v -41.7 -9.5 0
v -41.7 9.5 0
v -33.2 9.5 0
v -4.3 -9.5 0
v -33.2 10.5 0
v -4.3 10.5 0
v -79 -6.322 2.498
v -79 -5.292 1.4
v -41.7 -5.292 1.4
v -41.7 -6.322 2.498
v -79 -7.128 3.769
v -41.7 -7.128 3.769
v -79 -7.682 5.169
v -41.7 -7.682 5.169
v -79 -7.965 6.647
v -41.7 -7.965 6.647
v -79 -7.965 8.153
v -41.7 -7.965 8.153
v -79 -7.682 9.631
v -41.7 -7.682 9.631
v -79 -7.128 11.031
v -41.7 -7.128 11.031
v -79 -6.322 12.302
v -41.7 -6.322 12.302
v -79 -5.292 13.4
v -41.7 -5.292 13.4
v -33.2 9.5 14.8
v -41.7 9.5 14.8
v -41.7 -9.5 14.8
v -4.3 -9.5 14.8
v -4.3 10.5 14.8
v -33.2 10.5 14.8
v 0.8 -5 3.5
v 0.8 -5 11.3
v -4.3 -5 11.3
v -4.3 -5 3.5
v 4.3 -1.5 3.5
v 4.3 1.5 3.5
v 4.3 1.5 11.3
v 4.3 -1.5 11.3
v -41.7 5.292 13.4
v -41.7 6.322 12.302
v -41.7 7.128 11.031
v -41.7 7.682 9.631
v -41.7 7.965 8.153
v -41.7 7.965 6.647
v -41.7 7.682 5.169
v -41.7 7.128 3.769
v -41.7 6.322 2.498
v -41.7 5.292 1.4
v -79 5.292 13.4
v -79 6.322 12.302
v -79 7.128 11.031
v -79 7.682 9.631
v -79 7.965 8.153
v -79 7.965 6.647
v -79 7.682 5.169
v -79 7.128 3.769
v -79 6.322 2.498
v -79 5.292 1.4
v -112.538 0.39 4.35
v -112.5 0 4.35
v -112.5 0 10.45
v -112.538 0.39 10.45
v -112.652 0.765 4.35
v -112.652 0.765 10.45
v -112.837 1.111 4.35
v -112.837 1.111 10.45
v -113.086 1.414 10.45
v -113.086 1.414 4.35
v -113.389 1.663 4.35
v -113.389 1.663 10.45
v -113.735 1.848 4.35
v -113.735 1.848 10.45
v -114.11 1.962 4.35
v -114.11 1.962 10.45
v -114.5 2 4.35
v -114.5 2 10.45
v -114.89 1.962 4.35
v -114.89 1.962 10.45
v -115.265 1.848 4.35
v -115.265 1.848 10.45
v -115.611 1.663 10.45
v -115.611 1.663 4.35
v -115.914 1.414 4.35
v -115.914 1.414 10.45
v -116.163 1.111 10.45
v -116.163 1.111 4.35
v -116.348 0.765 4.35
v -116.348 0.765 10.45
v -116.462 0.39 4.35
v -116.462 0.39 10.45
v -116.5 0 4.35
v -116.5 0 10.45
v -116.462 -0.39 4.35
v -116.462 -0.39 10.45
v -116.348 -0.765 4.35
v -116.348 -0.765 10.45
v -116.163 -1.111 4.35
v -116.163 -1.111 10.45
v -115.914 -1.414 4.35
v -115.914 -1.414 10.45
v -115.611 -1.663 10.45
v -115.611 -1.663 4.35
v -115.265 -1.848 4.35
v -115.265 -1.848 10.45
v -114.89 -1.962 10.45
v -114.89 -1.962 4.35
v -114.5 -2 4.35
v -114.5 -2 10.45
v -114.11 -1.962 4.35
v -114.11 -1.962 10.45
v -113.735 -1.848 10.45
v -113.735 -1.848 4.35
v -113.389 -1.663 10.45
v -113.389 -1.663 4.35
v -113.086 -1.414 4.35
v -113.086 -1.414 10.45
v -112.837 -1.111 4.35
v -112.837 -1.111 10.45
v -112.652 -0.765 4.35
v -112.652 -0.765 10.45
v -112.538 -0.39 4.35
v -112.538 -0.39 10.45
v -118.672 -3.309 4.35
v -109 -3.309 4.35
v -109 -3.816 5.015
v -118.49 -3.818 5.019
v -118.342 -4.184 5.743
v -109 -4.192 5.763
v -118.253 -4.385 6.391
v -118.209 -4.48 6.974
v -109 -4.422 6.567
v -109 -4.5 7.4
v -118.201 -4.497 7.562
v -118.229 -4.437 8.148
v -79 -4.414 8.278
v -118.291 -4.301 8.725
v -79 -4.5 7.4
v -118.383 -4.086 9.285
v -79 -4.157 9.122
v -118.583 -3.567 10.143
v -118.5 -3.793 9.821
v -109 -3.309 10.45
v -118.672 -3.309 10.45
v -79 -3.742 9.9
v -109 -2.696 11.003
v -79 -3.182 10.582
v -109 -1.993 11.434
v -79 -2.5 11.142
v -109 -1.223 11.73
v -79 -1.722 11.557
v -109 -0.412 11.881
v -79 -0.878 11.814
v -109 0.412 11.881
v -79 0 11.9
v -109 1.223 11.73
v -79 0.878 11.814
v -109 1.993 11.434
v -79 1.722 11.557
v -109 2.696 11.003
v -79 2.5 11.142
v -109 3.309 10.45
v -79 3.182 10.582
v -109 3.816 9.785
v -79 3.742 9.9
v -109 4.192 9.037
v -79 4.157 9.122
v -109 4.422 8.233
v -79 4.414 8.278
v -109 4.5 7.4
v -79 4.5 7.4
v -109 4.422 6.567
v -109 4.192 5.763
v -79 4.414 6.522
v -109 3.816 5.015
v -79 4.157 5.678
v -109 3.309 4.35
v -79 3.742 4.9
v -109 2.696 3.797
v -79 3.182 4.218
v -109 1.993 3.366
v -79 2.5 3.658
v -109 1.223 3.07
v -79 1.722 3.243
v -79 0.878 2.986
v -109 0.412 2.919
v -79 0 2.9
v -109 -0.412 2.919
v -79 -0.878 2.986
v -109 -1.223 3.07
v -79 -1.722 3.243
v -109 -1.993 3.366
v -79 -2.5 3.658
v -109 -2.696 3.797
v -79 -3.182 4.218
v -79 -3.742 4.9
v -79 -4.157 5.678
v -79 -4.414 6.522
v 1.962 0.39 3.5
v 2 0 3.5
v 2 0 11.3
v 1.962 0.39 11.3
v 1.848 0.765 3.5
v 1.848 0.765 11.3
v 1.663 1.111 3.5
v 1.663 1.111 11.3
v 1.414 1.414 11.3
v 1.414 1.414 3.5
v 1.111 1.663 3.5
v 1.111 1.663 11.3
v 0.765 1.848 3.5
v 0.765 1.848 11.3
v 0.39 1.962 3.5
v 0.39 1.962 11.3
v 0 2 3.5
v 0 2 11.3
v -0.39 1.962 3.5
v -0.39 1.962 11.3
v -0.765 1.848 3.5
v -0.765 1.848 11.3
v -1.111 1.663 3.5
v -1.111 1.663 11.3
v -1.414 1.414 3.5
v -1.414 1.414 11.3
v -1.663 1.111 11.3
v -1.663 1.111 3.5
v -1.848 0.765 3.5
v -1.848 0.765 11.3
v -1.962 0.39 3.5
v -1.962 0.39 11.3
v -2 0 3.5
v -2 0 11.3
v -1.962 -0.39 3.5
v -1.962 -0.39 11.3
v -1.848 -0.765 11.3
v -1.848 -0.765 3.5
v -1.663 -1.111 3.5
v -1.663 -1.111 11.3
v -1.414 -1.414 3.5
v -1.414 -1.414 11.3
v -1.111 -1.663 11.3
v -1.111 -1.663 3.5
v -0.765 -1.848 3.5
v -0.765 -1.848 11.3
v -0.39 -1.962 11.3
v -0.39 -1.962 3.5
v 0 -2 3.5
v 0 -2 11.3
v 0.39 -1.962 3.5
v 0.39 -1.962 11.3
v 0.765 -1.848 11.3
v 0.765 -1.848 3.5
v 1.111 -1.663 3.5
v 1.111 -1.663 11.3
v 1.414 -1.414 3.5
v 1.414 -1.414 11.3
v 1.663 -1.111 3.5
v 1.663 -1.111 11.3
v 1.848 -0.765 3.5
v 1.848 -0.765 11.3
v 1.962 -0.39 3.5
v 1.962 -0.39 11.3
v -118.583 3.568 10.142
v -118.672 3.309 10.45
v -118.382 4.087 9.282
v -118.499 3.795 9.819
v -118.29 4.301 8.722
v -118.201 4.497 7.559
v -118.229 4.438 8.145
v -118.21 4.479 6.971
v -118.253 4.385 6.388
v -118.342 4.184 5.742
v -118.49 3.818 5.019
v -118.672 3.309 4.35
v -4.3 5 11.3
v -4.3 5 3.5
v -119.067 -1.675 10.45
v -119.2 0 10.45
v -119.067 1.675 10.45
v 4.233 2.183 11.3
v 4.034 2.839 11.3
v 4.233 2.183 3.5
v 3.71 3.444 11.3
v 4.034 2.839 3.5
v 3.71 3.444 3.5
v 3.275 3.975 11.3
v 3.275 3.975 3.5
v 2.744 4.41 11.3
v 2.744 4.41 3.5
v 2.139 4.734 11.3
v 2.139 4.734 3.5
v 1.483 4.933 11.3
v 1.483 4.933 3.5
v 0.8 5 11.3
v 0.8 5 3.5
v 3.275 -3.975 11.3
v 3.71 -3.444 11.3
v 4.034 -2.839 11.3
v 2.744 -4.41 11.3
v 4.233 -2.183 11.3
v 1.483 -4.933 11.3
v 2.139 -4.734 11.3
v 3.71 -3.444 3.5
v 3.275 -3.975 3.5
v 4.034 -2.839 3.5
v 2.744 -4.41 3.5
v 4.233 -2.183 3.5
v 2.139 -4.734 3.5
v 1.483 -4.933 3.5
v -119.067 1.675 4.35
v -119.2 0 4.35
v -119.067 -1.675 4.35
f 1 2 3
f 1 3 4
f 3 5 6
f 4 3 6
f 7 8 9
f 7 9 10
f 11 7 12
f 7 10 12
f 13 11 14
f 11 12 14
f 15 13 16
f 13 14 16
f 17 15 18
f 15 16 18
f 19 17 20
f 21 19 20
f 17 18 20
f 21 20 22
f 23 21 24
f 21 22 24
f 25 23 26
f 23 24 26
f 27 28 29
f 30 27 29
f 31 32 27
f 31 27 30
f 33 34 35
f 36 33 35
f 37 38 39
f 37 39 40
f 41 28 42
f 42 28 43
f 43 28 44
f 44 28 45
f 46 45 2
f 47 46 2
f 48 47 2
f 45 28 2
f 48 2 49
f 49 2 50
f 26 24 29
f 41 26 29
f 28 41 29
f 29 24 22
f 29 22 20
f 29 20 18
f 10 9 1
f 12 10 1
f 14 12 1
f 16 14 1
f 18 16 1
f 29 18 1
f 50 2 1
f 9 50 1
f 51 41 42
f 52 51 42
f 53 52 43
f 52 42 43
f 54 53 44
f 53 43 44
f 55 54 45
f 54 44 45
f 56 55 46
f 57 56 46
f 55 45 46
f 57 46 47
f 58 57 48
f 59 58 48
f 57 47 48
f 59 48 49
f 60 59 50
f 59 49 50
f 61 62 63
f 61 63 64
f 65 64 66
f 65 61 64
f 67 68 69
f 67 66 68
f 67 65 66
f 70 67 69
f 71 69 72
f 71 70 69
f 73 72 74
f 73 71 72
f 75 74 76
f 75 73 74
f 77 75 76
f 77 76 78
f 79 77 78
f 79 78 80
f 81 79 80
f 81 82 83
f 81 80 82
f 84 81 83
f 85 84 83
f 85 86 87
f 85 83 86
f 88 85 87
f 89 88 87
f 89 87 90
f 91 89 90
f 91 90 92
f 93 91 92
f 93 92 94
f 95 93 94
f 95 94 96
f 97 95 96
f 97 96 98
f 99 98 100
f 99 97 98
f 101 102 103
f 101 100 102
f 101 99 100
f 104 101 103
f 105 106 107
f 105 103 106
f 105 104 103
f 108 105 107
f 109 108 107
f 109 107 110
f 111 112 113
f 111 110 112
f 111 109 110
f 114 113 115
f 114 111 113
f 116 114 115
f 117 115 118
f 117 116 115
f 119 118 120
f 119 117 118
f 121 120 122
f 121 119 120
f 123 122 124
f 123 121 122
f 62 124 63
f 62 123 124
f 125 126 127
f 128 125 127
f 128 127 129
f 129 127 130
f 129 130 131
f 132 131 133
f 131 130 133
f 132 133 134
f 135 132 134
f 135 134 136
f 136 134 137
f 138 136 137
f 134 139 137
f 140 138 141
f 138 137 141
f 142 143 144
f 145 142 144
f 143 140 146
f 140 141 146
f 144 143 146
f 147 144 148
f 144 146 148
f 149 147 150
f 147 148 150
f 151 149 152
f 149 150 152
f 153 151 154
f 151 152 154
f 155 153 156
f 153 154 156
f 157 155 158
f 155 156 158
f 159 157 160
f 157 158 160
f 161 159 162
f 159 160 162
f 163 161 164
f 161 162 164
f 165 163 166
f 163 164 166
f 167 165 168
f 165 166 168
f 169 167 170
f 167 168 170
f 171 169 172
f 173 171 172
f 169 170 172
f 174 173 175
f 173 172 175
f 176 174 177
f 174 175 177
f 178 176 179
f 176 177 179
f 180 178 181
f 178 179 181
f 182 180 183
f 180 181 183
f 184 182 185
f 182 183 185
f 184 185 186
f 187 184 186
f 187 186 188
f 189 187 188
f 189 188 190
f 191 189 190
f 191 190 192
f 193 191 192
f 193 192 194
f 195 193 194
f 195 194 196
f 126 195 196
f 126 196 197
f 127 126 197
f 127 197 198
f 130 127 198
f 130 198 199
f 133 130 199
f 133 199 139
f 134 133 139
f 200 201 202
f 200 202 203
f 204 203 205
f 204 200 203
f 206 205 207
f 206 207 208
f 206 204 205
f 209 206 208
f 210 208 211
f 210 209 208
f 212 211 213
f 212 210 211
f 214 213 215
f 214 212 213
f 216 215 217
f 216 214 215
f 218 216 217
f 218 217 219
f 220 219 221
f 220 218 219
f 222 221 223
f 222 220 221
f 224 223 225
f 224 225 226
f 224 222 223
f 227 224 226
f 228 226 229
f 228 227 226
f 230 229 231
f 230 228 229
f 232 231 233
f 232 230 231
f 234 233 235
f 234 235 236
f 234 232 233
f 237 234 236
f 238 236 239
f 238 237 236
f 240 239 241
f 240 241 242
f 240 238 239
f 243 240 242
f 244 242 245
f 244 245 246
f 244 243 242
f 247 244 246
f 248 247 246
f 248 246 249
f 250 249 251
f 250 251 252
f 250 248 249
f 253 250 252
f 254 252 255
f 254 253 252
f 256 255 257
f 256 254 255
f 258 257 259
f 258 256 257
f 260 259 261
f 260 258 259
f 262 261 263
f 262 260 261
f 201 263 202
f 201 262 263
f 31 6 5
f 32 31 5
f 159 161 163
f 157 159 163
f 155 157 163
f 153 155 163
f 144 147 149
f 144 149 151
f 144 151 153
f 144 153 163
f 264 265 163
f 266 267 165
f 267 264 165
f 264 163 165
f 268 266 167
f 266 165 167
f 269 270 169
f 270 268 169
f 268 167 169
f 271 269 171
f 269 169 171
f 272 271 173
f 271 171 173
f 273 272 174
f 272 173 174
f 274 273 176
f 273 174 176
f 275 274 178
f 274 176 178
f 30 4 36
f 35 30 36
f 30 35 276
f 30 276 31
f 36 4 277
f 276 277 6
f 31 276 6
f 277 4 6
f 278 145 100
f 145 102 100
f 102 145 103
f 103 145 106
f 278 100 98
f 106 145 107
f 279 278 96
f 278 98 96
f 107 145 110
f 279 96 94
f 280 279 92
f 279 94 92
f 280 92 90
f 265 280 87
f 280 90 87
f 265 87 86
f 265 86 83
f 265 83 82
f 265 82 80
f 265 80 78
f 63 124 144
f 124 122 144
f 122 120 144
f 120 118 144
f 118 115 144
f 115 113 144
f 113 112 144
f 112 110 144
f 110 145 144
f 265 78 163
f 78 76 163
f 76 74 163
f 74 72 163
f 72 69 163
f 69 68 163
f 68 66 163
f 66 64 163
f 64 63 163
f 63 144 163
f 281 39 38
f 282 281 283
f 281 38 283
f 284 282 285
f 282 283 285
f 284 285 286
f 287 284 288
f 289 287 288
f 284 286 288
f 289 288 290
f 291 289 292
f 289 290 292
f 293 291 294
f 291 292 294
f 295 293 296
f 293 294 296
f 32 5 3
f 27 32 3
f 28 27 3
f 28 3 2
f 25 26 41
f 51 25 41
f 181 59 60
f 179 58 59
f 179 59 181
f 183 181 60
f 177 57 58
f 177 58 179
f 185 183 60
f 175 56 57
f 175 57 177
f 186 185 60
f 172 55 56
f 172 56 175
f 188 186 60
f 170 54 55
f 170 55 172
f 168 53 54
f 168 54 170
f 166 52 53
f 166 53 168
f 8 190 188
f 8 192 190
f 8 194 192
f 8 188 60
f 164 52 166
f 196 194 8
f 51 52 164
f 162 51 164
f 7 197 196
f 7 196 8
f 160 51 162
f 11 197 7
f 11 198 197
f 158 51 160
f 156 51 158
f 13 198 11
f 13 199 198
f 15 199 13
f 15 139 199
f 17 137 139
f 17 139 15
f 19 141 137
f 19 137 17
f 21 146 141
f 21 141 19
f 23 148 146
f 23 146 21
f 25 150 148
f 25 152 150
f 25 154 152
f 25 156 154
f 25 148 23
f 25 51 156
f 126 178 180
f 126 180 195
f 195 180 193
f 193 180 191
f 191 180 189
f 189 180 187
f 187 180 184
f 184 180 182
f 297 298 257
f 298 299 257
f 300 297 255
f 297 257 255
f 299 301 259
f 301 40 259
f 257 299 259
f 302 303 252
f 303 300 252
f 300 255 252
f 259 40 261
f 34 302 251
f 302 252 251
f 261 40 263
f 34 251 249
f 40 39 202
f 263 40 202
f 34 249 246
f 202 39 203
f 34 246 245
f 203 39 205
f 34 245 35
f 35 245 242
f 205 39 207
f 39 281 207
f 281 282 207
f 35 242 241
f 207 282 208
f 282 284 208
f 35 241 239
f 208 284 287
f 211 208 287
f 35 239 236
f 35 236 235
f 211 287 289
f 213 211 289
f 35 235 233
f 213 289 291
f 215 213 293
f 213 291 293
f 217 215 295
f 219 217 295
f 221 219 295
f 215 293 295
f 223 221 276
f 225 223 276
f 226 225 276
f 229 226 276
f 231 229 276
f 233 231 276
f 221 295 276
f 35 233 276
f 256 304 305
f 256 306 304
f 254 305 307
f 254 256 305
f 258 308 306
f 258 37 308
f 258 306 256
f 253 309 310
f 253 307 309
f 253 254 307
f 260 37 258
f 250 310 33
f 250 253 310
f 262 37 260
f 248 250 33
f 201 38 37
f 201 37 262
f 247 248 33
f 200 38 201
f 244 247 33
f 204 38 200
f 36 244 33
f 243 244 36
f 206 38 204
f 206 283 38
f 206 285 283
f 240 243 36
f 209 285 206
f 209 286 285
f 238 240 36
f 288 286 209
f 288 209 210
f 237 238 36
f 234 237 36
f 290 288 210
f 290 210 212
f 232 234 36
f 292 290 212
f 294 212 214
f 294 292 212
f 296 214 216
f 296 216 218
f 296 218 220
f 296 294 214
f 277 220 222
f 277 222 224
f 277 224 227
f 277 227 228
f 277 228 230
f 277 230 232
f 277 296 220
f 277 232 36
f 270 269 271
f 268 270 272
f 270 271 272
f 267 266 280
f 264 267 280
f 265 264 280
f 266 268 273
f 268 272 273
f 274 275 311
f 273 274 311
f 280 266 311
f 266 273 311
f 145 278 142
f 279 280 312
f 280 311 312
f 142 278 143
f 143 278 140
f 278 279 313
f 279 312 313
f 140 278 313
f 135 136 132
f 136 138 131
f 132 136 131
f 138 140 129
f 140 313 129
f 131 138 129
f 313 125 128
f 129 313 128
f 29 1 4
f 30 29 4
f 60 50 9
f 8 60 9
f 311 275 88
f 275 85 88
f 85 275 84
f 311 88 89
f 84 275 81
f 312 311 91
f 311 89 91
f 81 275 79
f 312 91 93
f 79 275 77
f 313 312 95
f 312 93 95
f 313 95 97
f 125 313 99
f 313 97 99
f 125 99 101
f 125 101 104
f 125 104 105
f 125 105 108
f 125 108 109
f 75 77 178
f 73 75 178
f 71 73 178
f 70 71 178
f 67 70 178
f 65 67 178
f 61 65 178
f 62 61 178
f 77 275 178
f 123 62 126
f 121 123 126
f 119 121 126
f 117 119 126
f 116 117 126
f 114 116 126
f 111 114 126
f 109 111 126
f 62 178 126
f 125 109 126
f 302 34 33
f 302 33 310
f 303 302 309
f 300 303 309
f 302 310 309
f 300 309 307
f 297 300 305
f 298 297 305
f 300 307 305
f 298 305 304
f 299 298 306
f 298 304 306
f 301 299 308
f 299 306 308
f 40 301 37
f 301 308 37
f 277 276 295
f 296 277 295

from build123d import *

# Parameters (mm, degrees)
PAD001_DEPTH = 14.8
SKETCH004_R  = 2
PAD002_DEPTH = 7.8
PAD003_DEPTH = 37.3
SKETCH008_R  = 4.5
PAD004_DEPTH = 30
PAD005_DEPTH = 11
SKETCH007_R  = 2
POCKET_DEPTH = 14.801


with BuildPart() as part:
    # Sketch003 → Pad001 (new body)
    with BuildSketch(Plane.XY):
        Polygon((0, 0), (37.4, 0), (37.4, 20), (8.5, 20), (8.5, 19), (0, 19), align=None)
    extrude(amount=PAD001_DEPTH)

    # Sketch004 → Pad002 (join)
    with BuildSketch(Plane.XY.offset(3.5)):
        with BuildLine():
            Line((37.4, 14.5), (42.5, 14.5))
            ThreePointArc((46, 11), (44.9748737342, 13.4748737342), (42.5, 14.5))
            Line((46, 11), (46, 8))
            ThreePointArc((42.5, 4.5), (44.9748737342, 5.5251262658), (46, 8))
            Line((42.5, 4.5), (37.4, 4.5))
            Line((37.4, 4.5), (37.4, 14.5))
        make_face()
        with Locations((41.7, 9.5)):
            Circle(SKETCH004_R, mode=Mode.SUBTRACT)
    extrude(amount=PAD002_DEPTH)

    # Sketch005 → Pad003 (join)
    with BuildSketch(Plane(origin=(0, 0, 0), x_dir=(0, -1, 0), z_dir=(-1, 0, 0))):
        with BuildLine():
            Line((-4.2084973779, 13.4), (-14.7915026221, 13.4))
            ThreePointArc((-14.7915026221, 13.4), (-17.5, 7.4), (-14.7915026221, 1.4))
            Line((-14.7915026221, 1.4), (-4.2084973779, 1.4))
            ThreePointArc((-4.2084973779, 1.4), (-1.5, 7.4), (-4.2084973779, 13.4))
        make_face()
    extrude(amount=PAD003_DEPTH)

    # Sketch008 (on Face17 of Pad003) → Pad004 (join)
    with BuildSketch(Plane(origin=(-37.3, 0, 0), x_dir=(0, -1, 0), z_dir=(-1, 0, 0))):
        with Locations((-9.5, 7.4)):
            Circle(SKETCH008_R)
    extrude(amount=PAD004_DEPTH)

    # Sketch006 (on Face17 of Pad003) → Pad005 (join)
    with BuildSketch(Plane(origin=(-67.3, 0, 0), x_dir=(0, -1, 0), z_dir=(-1, 0, 0))):
        with BuildLine():
            Line((-6.1912993487, 10.45), (-12.8087006513, 10.45))
            ThreePointArc((-12.8087006513, 10.45), (-14, 7.4), (-12.8087006513, 4.35))
            Line((-12.8087006513, 4.35), (-6.1912993487, 4.35))
            ThreePointArc((-6.1912993487, 4.35), (-5, 7.4), (-6.1912993487, 10.45))
        make_face()
    extrude(amount=PAD005_DEPTH)

    # Sketch007 → Pocket (cut, through all)
    with BuildSketch(Plane.XY):
        with Locations((-72.8, 9.5)):
            Circle(SKETCH007_R)
        with BuildLine():
            ThreePointArc((-76.5, 14), (-77.5, 9.5), (-76.5, 5))
            Line((-86.5, 5), (-76.5, 5))
            Line((-86.5, 14), (-86.5, 5))
            Line((-76.5, 14), (-86.5, 14))
        make_face()
    extrude(amount=POCKET_DEPTH, mode=Mode.SUBTRACT)


with BuildPart() as part_1:
    # Body002 placement: moved
    add(part.part.moved(Location((-41.7, -9.5, 0))))


solid = part_1.part
